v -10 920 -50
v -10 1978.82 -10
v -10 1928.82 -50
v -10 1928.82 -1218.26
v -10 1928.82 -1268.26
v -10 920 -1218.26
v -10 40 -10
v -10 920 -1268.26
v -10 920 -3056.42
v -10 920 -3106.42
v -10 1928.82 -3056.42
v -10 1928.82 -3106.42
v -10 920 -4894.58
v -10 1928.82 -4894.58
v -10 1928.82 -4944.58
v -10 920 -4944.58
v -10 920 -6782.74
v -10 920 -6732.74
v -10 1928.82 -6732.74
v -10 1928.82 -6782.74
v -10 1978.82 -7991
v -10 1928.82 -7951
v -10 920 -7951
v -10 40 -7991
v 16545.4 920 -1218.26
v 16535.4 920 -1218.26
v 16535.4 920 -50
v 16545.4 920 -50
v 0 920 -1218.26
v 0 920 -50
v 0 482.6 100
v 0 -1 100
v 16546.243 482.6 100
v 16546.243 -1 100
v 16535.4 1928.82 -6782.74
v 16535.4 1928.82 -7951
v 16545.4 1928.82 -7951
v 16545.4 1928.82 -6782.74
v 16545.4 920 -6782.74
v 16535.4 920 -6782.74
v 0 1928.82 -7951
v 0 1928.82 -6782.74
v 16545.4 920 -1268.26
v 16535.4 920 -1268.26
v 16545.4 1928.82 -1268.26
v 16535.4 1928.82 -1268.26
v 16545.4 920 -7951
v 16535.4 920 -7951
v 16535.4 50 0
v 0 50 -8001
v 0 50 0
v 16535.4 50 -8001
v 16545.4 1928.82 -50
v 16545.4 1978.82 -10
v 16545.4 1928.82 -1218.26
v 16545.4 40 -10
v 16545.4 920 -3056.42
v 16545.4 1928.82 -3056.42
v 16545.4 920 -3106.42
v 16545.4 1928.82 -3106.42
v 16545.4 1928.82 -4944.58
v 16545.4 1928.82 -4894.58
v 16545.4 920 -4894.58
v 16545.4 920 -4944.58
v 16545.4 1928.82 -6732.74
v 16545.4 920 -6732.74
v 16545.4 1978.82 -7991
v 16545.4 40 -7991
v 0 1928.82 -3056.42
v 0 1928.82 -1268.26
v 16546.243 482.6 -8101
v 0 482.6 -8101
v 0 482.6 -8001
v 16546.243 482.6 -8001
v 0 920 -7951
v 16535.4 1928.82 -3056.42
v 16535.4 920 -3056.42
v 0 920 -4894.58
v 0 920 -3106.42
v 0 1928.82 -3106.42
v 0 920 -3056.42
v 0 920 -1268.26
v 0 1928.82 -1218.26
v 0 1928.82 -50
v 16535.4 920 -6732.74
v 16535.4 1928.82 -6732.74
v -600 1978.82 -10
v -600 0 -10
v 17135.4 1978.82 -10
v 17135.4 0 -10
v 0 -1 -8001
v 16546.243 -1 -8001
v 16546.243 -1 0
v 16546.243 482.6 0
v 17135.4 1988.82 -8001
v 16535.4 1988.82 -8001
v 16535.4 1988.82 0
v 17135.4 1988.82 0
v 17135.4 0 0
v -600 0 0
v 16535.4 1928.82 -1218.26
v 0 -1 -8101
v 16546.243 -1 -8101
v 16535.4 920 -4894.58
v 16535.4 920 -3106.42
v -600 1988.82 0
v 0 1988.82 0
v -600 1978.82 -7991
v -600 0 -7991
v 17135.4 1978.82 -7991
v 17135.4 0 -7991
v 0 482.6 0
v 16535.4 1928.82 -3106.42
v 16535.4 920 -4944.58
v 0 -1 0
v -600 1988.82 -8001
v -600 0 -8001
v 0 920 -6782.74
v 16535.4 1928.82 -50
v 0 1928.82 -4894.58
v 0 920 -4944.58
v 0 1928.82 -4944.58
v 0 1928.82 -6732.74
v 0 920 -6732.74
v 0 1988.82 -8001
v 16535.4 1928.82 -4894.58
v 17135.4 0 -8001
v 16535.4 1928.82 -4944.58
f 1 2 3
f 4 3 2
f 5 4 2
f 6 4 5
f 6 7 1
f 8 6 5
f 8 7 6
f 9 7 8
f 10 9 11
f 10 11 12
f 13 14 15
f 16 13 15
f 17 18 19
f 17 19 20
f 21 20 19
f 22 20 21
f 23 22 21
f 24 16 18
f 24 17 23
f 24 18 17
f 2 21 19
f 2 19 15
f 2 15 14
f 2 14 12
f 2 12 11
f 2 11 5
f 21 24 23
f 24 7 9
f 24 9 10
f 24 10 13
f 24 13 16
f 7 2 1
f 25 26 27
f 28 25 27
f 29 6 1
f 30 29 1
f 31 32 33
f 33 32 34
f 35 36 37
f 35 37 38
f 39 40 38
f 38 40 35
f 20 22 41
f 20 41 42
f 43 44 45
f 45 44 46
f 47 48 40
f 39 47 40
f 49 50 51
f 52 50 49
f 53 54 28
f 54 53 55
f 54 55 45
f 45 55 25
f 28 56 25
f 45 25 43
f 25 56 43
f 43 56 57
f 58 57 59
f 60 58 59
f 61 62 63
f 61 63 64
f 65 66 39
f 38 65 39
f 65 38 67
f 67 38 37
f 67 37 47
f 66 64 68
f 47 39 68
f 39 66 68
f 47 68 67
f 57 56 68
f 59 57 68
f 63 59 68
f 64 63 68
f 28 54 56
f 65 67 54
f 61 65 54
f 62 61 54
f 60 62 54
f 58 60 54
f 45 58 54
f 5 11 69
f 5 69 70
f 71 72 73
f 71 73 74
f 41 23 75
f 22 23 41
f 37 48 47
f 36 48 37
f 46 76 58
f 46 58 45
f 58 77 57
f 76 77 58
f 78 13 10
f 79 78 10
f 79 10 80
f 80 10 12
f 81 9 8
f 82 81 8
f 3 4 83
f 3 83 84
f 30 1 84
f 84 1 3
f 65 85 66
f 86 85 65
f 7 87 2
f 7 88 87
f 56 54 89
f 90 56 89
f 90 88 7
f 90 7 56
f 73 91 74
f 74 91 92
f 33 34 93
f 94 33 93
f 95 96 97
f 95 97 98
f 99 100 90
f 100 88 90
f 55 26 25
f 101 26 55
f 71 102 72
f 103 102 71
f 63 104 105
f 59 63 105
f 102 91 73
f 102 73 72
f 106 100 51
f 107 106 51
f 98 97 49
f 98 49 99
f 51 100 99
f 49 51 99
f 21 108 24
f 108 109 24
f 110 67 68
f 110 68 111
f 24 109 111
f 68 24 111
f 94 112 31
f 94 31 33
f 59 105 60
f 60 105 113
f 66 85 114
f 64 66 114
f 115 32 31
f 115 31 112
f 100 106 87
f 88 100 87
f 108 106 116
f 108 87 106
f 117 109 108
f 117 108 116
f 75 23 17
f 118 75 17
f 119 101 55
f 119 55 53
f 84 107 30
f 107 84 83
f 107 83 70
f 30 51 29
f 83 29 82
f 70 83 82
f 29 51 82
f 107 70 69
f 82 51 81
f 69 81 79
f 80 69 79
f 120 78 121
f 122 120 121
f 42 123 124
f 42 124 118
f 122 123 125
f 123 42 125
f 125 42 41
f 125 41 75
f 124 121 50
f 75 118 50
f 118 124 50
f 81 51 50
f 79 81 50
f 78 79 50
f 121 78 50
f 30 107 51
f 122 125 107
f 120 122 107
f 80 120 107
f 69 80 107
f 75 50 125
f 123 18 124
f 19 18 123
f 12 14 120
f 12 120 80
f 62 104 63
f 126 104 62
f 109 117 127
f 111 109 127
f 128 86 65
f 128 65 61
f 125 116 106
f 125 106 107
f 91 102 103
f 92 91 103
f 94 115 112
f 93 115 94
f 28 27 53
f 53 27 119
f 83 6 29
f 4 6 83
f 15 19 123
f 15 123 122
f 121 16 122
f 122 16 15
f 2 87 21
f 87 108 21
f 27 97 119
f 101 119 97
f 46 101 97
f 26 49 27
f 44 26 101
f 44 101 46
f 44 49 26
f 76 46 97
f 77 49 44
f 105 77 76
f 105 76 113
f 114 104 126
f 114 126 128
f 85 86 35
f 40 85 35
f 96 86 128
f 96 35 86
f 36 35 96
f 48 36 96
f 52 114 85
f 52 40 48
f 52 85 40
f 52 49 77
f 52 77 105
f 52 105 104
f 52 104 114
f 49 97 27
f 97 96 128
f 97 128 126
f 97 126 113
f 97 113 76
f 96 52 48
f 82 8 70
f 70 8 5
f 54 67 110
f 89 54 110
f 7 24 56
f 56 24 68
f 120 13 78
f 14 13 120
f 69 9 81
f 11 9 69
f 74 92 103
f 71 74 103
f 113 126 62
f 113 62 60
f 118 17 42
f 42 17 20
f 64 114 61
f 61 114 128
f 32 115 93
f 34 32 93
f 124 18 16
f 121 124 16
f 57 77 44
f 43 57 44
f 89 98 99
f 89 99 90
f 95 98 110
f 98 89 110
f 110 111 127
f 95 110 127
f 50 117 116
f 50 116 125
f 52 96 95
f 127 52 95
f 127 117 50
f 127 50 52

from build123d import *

# Parameters (mm, degrees)
SKETCH1_W                   = 16535.4
SKETCH1_H                   = 8001
BOSS_EXTRUDE1_DEPTH         = 50
SKETCH2_W                   = 600
SKETCH2_H                   = 8001
BOSS_EXTRUDE2_DEPTH         = 1988.82
BOSS_EXTRUDE12_DEPTH        = 482.6
BOSS_EXTRUDE12_DEPTH_BACK   = 1
SKETCH3_W                   = 16546.243074812
SKETCH3_H                   = 100
BOSS_EXTRUDE12_2_DEPTH      = 482.6
BOSS_EXTRUDE12_2_DEPTH_BACK = 1
SHELL1_T                    = -10
SKETCH5_W                   = 1168.26
SKETCH5_H                   = 1008.82
SKETCH5_W_2                 = 1788.16
CUT_EXTRUDE1_DEPTH          = 19067.891386705


with BuildPart() as part:
    # Sketch1 → Boss-Extrude1 (new body)
    with BuildSketch(Plane(origin=(0, 0, 0), x_dir=(1, 0, 0), z_dir=(0, 1, 0))):
        with Locations((8267.7, 4000.5)):
            Rectangle(SKETCH1_W, SKETCH1_H)
    extrude(amount=BOSS_EXTRUDE1_DEPTH)

    # Sketch2 → Boss-Extrude2 (add)
    with BuildSketch(Plane(origin=(0, 0, 0), x_dir=(1, 0, 0), z_dir=(0, 1, 0))):
        with Locations((-300, 4000.5)):
            Rectangle(SKETCH2_W, SKETCH2_H)
        with Locations((16835.4, 4000.5)):
            Rectangle(SKETCH2_W, SKETCH2_H)
    extrude(amount=BOSS_EXTRUDE2_DEPTH)

    # Shell1
    shell1_openings = [part.faces().sort_by_distance(p)[0] for p in [
        (-600, 994.41, -4000.5),
        (17135.4, 994.41, -4000.5),
        (8267.7, 0, -4000.5),
    ]]
    offset(amount=SHELL1_T, openings=shell1_openings, kind=Kind.INTERSECTION)

    # Sketch5 → Cut-Extrude1 (cut, through all)
    with BuildSketch(Plane.ZY.offset(10)):
        with Locations((-7366.87, 1424.41)):
            Rectangle(SKETCH5_W, SKETCH5_H)
        with Locations((-2162.34, 1424.41)):
            Rectangle(SKETCH5_W_2, SKETCH5_H)
        with Locations((-634.13, 1424.41)):
            Rectangle(SKETCH5_W, SKETCH5_H)
        with Locations((-5838.66, 1424.41)):
            Rectangle(SKETCH5_W_2, SKETCH5_H)
        with Locations((-4000.5, 1424.41)):
            Rectangle(SKETCH5_W_2, SKETCH5_H)
    extrude(amount=-CUT_EXTRUDE1_DEPTH, mode=Mode.SUBTRACT)


with BuildPart() as body_2:
    # Sketch3 → Boss-Extrude12 (new, two sides: drawn at the far end of the back side and taken through both)
    with BuildSketch(Plane(origin=(0, 0, 0), x_dir=(1, 0, 0), z_dir=(0, 1, 0)).offset(-BOSS_EXTRUDE12_DEPTH_BACK)):
        with Locations((8273.121537406, 8051)):
            Rectangle(SKETCH3_W, SKETCH3_H)
    extrude(amount=BOSS_EXTRUDE12_DEPTH + BOSS_EXTRUDE12_DEPTH_BACK)


with BuildPart() as body_3:
    # Sketch3 → Boss-Extrude12 2 (new, two sides: drawn at the far end of the back side and taken through both)
    with BuildSketch(Plane(origin=(0, 0, 0), x_dir=(1, 0, 0), z_dir=(0, 1, 0)).offset(-BOSS_EXTRUDE12_2_DEPTH_BACK)):
        with Locations((8273.121537406, -50)):
            Rectangle(SKETCH3_W, SKETCH3_H)
    extrude(amount=BOSS_EXTRUDE12_2_DEPTH + BOSS_EXTRUDE12_2_DEPTH_BACK)


solid = Compound([part.part, body_2.part, body_3.part])
